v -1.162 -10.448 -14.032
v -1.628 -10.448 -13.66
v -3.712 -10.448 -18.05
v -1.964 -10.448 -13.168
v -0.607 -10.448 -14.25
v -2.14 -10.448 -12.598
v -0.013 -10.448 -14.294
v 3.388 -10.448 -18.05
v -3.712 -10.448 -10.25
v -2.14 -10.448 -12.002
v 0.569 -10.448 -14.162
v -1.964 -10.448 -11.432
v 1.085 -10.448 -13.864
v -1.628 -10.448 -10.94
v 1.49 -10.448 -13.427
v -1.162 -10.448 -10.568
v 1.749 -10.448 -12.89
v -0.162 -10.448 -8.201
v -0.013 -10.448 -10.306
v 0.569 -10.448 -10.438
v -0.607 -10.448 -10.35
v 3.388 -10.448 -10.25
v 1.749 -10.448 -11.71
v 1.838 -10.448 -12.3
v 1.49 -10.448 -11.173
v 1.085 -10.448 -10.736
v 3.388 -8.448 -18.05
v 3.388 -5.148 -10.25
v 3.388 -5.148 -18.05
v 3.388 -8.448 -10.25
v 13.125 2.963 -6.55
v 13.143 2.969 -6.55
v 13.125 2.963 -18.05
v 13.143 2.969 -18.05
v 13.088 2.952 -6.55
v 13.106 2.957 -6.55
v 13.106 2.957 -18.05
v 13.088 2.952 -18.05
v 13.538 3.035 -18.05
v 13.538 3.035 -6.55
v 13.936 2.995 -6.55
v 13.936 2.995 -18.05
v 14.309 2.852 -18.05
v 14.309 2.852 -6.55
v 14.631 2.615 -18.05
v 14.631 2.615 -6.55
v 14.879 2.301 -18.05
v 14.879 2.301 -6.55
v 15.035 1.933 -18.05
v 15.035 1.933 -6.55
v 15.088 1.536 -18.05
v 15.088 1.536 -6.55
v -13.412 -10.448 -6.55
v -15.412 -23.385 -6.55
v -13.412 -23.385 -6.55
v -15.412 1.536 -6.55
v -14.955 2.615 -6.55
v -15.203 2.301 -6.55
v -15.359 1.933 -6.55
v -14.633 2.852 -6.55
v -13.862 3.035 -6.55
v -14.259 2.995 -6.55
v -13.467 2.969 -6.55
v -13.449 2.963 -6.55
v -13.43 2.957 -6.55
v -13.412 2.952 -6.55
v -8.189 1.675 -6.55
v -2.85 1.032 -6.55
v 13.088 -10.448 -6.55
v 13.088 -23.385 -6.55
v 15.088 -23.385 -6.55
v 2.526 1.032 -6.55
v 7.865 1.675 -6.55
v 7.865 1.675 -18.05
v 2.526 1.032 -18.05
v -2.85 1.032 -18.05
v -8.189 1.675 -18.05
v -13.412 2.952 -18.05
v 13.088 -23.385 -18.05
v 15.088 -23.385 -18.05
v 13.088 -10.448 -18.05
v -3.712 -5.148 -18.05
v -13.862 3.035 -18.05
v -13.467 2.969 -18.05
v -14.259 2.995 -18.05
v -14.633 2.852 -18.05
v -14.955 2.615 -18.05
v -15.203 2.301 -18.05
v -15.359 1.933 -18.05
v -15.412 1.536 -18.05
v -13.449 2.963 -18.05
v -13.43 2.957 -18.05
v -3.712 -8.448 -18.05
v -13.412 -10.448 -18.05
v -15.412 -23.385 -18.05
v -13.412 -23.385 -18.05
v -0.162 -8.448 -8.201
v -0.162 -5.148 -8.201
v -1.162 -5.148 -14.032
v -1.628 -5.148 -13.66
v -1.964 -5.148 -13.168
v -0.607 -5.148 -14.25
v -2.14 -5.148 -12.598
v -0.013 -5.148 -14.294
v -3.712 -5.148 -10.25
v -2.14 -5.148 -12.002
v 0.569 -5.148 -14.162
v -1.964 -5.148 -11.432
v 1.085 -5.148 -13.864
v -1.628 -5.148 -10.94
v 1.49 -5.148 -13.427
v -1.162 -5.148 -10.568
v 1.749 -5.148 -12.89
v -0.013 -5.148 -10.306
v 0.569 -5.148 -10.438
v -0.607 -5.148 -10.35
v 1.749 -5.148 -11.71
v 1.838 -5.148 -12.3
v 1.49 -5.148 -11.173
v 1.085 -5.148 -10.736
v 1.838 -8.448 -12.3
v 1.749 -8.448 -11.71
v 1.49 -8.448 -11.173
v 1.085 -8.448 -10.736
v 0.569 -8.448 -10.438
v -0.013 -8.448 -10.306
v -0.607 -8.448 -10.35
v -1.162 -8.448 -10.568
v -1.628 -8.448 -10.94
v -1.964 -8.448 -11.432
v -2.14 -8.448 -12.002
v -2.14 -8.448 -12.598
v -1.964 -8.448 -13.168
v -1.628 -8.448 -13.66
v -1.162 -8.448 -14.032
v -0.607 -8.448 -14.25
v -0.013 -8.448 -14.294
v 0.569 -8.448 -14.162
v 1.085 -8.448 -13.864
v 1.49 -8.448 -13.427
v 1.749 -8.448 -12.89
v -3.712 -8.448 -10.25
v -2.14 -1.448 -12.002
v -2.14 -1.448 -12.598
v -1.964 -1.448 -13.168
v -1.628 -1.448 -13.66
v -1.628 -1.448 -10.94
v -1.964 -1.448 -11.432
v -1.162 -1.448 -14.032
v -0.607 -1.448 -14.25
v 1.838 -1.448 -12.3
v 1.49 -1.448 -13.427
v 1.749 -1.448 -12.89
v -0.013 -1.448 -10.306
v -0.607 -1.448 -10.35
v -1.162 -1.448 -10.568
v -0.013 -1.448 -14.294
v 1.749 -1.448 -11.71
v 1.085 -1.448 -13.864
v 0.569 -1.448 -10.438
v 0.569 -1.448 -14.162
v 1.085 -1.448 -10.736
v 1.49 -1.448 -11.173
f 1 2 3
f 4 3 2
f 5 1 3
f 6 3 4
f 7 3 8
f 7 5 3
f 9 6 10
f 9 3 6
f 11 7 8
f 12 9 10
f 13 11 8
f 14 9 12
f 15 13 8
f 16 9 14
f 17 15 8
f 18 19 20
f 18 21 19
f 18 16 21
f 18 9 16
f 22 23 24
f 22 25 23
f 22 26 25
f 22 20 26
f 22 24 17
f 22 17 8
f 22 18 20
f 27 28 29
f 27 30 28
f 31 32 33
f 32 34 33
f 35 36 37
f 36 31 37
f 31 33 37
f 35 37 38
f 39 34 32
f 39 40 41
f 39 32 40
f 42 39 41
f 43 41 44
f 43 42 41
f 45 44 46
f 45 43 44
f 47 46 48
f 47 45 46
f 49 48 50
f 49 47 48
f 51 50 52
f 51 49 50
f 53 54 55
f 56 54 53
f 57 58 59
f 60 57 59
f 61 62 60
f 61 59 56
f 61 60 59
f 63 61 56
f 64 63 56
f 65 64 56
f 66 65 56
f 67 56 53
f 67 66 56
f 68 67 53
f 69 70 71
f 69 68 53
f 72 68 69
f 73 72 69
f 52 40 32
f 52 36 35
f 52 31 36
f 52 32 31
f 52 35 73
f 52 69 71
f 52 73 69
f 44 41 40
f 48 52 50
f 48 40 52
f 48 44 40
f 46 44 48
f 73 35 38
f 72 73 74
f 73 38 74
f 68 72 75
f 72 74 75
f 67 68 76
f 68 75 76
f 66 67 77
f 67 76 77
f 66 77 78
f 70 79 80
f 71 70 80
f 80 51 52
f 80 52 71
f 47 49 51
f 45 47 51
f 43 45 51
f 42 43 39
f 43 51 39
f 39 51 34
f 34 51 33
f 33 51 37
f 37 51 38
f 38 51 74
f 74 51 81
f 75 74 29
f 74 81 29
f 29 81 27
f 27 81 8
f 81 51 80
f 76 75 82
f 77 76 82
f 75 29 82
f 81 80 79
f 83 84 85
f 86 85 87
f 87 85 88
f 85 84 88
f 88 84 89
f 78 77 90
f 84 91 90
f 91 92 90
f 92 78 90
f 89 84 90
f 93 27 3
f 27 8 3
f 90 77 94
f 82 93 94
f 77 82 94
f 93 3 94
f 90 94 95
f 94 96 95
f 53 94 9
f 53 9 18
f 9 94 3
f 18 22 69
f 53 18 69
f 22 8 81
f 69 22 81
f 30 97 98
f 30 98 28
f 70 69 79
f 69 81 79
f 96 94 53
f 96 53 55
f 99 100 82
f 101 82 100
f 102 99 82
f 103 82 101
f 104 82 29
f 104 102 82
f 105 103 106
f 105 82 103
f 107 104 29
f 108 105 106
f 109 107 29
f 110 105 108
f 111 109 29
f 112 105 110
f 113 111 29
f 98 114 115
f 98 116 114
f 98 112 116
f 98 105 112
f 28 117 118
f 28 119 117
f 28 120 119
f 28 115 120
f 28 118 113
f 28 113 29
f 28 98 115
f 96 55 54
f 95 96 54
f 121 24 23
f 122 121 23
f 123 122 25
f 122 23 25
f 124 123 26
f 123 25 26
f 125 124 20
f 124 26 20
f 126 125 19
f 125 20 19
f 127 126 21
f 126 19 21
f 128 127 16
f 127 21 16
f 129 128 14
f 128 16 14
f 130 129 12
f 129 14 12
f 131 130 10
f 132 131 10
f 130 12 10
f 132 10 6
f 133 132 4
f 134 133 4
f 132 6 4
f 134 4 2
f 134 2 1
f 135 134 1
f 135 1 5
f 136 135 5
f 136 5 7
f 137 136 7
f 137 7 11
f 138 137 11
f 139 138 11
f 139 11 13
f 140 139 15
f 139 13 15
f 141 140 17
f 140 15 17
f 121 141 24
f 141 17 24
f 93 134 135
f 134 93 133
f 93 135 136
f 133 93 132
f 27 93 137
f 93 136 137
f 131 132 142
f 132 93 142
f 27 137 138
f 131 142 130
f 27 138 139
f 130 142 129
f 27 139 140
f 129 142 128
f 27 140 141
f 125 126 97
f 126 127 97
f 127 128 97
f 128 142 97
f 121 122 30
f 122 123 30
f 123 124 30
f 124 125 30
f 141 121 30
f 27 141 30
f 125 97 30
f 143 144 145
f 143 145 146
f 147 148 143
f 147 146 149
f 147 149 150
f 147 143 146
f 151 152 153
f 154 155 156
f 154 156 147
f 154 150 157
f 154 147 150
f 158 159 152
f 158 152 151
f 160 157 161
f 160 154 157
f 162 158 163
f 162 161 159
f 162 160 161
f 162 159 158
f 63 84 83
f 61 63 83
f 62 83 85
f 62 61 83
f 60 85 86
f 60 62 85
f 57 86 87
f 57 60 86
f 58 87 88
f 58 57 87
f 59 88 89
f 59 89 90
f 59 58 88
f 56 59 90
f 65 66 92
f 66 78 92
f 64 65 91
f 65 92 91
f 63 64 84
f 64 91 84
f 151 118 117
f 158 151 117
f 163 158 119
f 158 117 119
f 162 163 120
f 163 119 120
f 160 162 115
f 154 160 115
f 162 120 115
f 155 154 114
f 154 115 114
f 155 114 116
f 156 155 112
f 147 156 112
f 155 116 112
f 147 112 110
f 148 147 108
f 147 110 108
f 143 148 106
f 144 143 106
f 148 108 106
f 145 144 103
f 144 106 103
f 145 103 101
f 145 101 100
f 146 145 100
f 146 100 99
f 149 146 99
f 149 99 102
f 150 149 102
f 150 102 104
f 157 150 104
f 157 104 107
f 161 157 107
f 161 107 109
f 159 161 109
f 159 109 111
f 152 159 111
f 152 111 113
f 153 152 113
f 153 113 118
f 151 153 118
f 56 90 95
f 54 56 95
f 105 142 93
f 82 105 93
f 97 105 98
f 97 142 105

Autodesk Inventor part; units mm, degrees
ref_plane "YZ Plane" through (0, 0, 0) normal (1, 0, 0) x (0, 1, 0)
ref_plane "XZ Plane" through (0, 0, 0) normal (0, 1, 0) x (-1, 0, 0)
ref_plane "XY Plane" through (0, 0, 0) normal (0, 0, 1) x (1, 0, 0)
ref_plane "РабПлоскость2" through (19.838, 4.4675, -12.3) normal (0, 0, 1) x (1, 0, 0)
ref_plane "РабПлоскость1" through (-13.412, 18.3334, -19.05) normal (0, 0, 1) x (1, 0, 0)
sketch "Эскиз1" plane through (19.838, 4.4675, -12.3) normal (0, 0, 1) x (1, 0, 0)
  line L0 (-17.838, -7.8158) -> (-21.838, -7.8158) projected
  line L1 (-21.838, -12.9158) -> (-17.838, -12.9158) projected
  line L2 (-15.838, -12.5585) -> (-15.838, -8.173) projected
  line L3 (-23.838, -12.5585) -> (-23.838, -8.173) projected
  line L4 (-15.688, -12.9158) -> (-23.988, -12.9158)
  line L5 (-23.988, -12.9158) -> (-23.988, -7.5158)
  line L6 (-23.988, -7.5158) -> (-15.688, -7.5158)
  line L7 (-15.688, -7.5158) -> (-15.688, -12.9158)
  line L8 (-15.688, -12.9158) -> (-23.988, -7.5158) construction
  line L9 (-19.838, -4.4675) -> (-19.838, -10.2158) construction
  line L10 (-15.388, -12.9158) -> (-24.288, -12.9158)
  line L11 (-6.75, -10.8528) -> (-33.25, -10.8528) projected
  line L12 (-33.25, -10.8528) -> (-6.75, -10.8528) projected
  line L13 (-33.25, -10.8528) -> (-6.75, -10.8528) construction
  line L14 (-24.938, -14.0158) -> (-14.738, -14.0158) projected
  line L15 (-15.388, -12.9158) -> (-24.288, -12.9158)
  line L16 (-19.838, -14.0158) -> (-19.838, -12.9158) construction
  line L17 (-13.838, -13.4658) -> (-25.838, -13.4658) construction
  line L18 (-25.838, -13.4658) -> (-25.838, -3.5158)
  line L19 (-25.838, -3.5158) -> (-13.838, -3.5158)
  line L20 (-13.838, -3.5158) -> (-13.838, -13.4658)
  line L21 (-6.75, -10.8528) -> (-33.25, -10.8528)
  line L22 (-33.25, -10.8528) -> (-33.25, -3.5158) construction
  line L23 (-33.25, -3.5158) -> (-6.75, -3.5158)
  line L24 (-6.75, -3.5158) -> (-6.75, -10.8528) construction
  line L25 (-6.75, -3.5158) -> (-6.75, -1.5158) construction
  line L26 (-33.25, -3.5158) -> (-33.25, -1.5158) construction
  arc A0 (-33.25, -1.5158) -> (-6.75, -1.5158) centre (-20, 41.3683) ccw
  line L27 (-25.838, -13.4658) -> (-13.838, -13.4658) construction
  line L28 (-13.838, -13.4658) -> (-25.838, -13.4658)
  line L29 (-4.75, -0.8459) -> (-4.75, -27.8528)
  line L30 (-35.25, -0.8459) -> (-35.25, -27.8528)
  arc A1 (-35.25, -0.8459) -> (-33.25, -1.5158) centre (-20, 41.3683) ccw
  arc A2 (-6.75, -1.5158) -> (-4.75, -0.8459) centre (-20, 41.3683) ccw
  line L31 (-33.25, -14.9158) -> (-33.25, -27.8528)
  line L32 (-33.25, -27.8528) -> (-35.25, -27.8528)
  line L33 (-6.75, -14.9158) -> (-6.75, -27.8528)
  line L34 (-6.75, -27.8528) -> (-4.75, -27.8528)
  line L35 (-33.25, -14.9158) -> (-6.75, -14.9158)
  point P0 (-19.838, -13.4658)
  point P1 (-19.838, -3.5158)
  point P2 (-25.838, -10.8528)
  point P3 (-13.838, -10.8528)
  point P4 (-20.162, -3.5158)
  point P5 (-15.688, -10.8528)
  point P6 (-23.988, -10.8528)
  point P7 (-20.162, -3.5158)
  point P8 (-17.838, -12.9158)
  dimension "d0" = 8.3
  dimension "d1" = 5.4
  dimension "d2" = 12
  dimension "d3" = 4
  dimension "d4" = 2
  dimension "d10" = 0
  dimension "d11" = 0.55
  dimension "d26" = 2
  dimension "d27" = 2
  dimension "d30" = 17
  dimension "d33" = 2
extrude "Выдавливание1" add sketch "Эскиз1" along normal mid plane 11.5 contours L4 L5 L11 L7 L1 | L1 L4 L7 L11 L20 L28 L18 L5 | L11 L18 L19 L20 L7 L6 L5 | L5 L6 L7 L11 | A0 A2 L29 L34 L33 L35 L31 L32 L30 A1
sketch "Эскиз3" plane through (-6, -10.4482, -6.55) normal (0, -1, 0) x (1, 0, 0)
  circle A0 centre (5.838, -5.75) radius 2
  line L0 (19.088, -11.5) -> (19.088, 0) projected
  line L1 (-7.412, -11.5) -> (-7.412, 0) projected
  line L2 (-7.412, 0) -> (19.088, -11.5) construction
  line L3 (5.838, 12.0241) -> (5.838, -23.5241) construction
  line L4 (-15.512, -5.75) -> (27.188, -5.75) construction
  line L5 (2.288, -3.7004) -> (5.838, -1.6508)
  line L6 (5.838, -1.6508) -> (9.388, -3.7004)
  line L7 (9.388, -3.7004) -> (9.388, -7.7996)
  line L8 (9.388, -7.7996) -> (5.838, -9.8492) construction
  line L9 (5.838, -9.8492) -> (2.288, -7.7996) construction
  line L10 (2.288, -7.7996) -> (2.288, -3.7004)
  line L11 (2.288, -7.7996) -> (2.288, -12.2488)
  line L12 (9.388, -7.7996) -> (9.388, -11.5)
  line L13 (19.088, -11.5) -> (-7.412, -11.5) projected
  point P0 (6, 6.55)
  point P1 (0, 0)
  point P2 (12, -12.8)
  point P3 (2.288, -5.75)
  point P4 (2.288, -11.5)
  dimension "d12" = 4
  dimension "d34" = 3.55
extrude "Выдавливание8" cut sketch "Эскиз3" against normal blind 5.3 contours A0 | L5 L6 L7 L12 L13 L11 L10
extrude "Выдавливание9" add sketch "Эскиз3" against normal blind 2
extrude "Выдавливание10" cut sketch "Эскиз3" against normal blind 9 contours A0
fillet "Сопряжение1" radius 1.5 2 edges at (-15.412, 3.6216, -12.3) (15.088, 3.6216, -12.3)
equation "\"d27\" = d26"
properties part number "kicker1.1"
